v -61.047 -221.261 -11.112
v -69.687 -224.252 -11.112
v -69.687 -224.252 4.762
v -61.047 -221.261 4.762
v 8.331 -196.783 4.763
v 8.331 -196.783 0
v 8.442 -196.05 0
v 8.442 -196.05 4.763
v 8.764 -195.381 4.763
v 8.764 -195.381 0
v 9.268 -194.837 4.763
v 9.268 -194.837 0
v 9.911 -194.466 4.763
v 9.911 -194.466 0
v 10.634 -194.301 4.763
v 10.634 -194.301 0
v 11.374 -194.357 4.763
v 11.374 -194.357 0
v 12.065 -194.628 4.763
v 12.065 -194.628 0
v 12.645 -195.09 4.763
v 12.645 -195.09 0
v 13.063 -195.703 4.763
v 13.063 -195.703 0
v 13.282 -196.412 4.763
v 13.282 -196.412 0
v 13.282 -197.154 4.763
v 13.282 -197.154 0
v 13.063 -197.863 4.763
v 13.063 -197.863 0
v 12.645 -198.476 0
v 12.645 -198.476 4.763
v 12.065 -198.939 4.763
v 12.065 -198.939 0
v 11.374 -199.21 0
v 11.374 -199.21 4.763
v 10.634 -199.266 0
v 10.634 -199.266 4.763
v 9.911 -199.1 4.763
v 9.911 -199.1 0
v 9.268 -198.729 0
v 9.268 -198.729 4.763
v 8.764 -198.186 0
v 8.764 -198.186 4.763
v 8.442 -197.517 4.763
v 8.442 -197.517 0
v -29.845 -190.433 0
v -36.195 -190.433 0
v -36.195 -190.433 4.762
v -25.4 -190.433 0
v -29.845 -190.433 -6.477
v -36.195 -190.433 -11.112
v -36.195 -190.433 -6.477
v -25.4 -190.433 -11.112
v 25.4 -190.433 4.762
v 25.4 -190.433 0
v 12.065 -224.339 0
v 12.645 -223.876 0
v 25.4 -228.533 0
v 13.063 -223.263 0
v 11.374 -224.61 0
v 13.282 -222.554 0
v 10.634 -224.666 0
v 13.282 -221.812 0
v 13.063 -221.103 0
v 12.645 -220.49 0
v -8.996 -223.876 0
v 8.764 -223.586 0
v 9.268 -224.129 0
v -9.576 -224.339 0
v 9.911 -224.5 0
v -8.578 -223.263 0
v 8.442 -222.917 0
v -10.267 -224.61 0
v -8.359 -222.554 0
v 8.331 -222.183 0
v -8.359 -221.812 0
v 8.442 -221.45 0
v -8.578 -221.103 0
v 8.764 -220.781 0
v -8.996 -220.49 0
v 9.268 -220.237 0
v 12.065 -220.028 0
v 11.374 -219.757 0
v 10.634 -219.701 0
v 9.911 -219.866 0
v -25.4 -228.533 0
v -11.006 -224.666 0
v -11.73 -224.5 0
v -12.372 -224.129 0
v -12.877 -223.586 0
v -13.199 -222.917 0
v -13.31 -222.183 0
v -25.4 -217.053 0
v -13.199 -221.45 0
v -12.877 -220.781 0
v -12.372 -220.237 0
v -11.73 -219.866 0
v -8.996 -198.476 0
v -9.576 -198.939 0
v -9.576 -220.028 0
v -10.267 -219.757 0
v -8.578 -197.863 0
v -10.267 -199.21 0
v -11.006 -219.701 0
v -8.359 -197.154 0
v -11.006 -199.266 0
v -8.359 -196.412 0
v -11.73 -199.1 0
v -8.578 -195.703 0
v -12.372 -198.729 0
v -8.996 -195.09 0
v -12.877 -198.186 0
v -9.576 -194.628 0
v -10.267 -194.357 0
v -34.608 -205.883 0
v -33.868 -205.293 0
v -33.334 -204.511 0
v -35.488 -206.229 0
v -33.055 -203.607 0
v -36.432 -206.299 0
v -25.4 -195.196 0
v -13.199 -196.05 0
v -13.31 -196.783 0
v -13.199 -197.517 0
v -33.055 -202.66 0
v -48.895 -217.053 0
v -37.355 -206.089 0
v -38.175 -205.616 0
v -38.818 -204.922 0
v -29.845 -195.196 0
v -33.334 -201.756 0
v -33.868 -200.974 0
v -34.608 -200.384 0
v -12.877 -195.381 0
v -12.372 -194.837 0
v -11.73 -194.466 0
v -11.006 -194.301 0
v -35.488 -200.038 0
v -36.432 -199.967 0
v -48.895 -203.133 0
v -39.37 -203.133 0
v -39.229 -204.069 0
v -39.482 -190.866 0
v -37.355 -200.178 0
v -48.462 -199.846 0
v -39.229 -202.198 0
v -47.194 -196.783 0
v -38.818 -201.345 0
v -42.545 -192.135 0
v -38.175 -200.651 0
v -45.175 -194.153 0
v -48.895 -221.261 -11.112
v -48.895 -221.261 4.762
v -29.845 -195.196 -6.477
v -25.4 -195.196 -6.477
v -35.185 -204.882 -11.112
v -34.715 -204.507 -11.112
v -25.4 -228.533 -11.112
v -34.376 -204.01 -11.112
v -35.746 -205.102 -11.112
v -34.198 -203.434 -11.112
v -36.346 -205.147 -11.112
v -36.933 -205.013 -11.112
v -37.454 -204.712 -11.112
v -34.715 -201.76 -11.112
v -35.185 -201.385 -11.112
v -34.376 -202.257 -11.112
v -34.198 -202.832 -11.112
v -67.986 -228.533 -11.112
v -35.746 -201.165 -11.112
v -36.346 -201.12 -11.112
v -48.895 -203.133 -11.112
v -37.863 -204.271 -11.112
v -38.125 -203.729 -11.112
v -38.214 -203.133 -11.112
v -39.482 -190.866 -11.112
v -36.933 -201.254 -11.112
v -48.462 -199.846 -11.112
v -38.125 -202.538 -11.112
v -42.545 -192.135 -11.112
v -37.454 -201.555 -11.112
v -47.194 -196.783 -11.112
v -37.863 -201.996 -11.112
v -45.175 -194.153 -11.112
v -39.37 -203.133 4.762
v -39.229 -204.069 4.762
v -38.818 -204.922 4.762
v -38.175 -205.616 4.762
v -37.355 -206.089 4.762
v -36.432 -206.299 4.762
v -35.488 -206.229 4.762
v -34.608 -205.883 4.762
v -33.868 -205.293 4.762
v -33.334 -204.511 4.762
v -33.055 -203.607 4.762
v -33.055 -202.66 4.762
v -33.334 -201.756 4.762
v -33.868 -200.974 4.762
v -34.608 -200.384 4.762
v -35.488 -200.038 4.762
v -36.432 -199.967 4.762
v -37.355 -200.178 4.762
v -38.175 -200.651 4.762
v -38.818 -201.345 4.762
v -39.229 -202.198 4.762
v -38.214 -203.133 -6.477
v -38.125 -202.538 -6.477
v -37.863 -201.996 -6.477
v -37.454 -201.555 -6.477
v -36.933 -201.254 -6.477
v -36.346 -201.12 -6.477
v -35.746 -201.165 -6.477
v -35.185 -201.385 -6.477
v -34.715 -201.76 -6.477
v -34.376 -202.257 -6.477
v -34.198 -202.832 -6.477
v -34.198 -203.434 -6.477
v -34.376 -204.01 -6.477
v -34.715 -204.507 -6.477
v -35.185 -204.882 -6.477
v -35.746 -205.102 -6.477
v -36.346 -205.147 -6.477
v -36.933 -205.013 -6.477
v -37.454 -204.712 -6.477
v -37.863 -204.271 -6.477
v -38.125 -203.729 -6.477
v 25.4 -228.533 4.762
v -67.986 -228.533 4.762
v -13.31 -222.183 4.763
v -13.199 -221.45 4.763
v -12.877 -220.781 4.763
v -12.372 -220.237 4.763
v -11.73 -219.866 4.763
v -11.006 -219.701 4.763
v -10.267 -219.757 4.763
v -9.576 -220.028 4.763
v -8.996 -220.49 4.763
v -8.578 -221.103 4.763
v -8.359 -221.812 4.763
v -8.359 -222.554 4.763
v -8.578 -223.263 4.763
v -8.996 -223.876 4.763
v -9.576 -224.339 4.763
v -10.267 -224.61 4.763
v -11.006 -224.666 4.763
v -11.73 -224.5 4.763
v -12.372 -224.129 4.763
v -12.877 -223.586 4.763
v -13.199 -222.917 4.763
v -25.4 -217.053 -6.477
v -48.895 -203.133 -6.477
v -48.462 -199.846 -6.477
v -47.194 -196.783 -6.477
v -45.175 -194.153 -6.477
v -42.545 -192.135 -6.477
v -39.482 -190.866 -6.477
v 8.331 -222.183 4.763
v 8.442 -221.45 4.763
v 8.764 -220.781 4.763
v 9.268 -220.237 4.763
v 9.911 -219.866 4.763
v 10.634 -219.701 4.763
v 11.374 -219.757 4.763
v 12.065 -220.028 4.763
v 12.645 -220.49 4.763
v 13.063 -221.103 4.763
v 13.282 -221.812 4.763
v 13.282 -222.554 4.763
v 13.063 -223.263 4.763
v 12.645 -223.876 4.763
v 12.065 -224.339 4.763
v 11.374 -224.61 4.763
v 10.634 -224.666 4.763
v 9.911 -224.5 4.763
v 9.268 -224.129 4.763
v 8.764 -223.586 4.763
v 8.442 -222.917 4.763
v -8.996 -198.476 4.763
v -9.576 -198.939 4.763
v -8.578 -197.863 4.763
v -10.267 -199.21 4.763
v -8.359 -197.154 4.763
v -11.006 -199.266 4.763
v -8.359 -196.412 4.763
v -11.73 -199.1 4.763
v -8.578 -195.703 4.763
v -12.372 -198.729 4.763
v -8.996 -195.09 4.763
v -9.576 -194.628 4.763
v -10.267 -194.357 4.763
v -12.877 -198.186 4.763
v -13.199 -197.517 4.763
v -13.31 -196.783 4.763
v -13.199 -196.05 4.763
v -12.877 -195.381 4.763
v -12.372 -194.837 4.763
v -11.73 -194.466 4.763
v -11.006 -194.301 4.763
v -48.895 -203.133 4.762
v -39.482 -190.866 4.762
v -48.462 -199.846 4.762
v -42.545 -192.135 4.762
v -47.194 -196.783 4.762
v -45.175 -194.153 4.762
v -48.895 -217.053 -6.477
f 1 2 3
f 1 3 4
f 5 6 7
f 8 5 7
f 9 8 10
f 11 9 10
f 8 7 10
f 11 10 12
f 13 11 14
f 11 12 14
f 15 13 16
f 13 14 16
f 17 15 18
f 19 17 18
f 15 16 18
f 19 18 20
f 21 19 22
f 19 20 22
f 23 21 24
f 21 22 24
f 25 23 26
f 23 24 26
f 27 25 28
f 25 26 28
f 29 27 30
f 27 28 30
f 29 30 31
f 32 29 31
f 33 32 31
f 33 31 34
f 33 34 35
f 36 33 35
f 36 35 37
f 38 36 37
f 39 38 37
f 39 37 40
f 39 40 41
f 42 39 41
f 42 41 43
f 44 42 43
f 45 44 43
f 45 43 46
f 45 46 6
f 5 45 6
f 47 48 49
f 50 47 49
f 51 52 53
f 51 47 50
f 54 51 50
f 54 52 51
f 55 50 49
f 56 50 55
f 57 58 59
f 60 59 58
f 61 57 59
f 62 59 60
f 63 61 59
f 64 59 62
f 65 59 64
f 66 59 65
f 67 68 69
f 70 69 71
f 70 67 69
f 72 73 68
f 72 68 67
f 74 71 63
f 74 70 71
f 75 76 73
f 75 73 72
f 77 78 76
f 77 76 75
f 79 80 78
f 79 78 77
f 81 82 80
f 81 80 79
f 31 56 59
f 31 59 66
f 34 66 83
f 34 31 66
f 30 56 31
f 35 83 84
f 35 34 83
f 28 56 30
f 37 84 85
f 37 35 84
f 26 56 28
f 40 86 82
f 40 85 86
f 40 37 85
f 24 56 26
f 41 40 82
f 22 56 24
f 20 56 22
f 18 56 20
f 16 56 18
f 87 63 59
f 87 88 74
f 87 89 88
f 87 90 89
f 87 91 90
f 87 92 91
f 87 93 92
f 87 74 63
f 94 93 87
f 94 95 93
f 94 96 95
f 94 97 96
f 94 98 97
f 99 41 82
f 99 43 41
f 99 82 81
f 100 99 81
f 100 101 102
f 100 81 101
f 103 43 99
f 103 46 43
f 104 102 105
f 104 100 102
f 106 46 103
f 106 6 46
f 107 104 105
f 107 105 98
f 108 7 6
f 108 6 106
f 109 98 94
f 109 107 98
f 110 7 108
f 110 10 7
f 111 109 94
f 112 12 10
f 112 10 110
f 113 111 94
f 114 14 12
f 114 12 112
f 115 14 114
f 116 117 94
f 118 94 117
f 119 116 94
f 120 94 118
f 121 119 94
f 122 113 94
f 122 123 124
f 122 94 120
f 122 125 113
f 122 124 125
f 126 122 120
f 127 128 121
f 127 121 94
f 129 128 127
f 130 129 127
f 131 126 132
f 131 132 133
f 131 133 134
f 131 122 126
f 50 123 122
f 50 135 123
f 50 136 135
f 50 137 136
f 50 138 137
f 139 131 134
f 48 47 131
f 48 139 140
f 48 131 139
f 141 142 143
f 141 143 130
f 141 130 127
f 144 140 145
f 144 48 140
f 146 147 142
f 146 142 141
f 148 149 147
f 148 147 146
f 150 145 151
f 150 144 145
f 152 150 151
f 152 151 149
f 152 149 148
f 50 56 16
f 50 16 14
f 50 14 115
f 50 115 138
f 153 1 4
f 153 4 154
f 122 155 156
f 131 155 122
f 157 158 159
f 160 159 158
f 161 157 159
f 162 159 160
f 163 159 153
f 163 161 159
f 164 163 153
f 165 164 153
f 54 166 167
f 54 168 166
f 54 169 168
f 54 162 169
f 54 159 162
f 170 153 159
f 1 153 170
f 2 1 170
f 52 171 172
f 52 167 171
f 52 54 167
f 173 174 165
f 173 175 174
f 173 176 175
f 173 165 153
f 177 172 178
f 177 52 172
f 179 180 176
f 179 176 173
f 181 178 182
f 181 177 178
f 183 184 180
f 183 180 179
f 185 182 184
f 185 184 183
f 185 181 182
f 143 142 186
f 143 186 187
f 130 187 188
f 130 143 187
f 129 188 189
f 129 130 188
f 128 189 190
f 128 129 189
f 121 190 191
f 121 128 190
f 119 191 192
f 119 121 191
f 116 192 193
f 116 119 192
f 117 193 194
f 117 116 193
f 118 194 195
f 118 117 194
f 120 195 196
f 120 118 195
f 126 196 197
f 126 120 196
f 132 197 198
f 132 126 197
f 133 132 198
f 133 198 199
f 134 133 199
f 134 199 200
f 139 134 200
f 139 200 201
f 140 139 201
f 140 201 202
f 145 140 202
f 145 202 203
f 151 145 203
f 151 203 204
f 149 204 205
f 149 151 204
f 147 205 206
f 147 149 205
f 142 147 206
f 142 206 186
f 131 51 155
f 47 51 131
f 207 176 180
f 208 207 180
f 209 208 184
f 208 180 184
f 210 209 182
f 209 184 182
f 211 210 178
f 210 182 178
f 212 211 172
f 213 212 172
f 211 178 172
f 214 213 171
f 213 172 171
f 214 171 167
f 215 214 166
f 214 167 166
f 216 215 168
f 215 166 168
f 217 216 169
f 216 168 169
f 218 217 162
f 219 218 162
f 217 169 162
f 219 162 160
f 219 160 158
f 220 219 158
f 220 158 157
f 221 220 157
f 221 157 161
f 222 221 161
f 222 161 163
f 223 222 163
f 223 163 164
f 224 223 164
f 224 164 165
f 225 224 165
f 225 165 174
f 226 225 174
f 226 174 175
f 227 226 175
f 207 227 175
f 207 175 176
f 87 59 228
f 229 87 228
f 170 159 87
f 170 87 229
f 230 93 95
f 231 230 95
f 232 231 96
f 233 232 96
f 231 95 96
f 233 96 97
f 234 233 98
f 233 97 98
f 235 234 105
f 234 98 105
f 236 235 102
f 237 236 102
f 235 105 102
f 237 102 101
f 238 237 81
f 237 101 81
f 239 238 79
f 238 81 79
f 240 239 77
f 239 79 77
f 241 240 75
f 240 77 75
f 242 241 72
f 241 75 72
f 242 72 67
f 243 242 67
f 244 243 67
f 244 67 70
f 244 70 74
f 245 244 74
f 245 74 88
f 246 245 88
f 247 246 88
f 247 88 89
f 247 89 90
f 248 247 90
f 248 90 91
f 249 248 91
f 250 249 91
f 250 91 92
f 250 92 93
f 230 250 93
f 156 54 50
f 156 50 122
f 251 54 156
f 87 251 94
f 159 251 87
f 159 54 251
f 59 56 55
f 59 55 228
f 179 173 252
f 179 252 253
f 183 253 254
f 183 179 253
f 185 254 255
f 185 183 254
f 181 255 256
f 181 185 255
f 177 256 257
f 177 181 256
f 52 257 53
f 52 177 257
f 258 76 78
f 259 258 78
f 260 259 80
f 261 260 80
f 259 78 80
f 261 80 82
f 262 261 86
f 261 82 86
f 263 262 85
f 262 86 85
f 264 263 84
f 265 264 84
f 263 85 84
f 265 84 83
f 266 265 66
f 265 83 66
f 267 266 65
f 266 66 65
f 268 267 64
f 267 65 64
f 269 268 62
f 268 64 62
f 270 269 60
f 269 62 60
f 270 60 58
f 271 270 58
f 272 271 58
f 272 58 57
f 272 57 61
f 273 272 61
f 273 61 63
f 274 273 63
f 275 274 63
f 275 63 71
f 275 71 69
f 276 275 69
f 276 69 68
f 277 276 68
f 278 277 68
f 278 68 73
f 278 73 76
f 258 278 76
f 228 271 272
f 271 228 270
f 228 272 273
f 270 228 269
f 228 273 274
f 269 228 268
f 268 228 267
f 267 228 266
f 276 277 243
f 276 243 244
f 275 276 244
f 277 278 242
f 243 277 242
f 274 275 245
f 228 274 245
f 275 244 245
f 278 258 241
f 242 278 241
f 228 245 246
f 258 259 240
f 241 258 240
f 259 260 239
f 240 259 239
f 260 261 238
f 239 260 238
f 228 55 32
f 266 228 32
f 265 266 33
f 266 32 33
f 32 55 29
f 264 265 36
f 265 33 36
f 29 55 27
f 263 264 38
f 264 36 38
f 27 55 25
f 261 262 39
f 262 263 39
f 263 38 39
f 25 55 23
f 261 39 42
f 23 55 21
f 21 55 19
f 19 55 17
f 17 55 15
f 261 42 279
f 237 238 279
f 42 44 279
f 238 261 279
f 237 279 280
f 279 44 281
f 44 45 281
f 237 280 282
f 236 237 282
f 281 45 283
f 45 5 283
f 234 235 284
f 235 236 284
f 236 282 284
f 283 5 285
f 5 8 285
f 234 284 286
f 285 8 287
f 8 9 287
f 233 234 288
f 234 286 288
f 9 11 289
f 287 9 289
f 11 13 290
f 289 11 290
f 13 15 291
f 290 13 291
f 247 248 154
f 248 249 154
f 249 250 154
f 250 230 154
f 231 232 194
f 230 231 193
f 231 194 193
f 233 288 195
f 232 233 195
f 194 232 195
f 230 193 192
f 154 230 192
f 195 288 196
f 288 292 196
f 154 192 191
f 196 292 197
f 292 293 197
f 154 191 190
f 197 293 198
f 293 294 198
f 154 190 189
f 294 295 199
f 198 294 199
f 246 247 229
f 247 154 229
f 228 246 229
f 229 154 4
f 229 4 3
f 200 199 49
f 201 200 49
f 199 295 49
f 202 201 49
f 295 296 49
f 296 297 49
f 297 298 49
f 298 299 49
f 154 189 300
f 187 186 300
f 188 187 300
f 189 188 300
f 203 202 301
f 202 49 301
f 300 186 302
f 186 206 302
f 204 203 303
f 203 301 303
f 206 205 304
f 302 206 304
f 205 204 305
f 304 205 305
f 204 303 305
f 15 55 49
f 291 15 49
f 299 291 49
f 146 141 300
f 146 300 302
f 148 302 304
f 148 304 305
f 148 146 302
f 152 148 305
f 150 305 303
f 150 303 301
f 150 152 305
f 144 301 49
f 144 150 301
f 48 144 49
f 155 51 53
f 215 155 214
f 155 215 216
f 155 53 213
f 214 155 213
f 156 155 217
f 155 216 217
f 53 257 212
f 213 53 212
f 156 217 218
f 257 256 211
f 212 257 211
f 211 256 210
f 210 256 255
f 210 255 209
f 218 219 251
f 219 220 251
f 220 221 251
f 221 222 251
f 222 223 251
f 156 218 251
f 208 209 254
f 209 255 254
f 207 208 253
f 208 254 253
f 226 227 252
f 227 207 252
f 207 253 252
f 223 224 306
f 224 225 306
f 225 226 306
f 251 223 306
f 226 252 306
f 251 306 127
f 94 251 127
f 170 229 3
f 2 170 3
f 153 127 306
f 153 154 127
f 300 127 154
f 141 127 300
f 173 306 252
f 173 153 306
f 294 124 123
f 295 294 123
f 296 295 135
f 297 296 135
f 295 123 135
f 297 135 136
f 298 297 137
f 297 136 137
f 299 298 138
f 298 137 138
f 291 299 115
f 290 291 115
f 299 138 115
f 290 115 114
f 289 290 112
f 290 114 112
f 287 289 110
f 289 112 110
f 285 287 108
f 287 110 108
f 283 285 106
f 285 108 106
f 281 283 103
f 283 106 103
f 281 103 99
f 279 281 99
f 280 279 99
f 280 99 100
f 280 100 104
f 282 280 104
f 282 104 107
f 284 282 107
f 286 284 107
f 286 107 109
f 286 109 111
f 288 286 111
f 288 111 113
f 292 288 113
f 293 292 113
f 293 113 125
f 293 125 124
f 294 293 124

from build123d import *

# Parameters (mm, degrees)
SKETCH2_R                  = 3.175
BOSS_EXTRUDE1_DEPTH        = 4.7625
BOSS_EXTRUDE2_START        = 11.1125
BOSS_EXTRUDE2_DEPTH        = 11.1125
SKETCH12_W                 = 6.477
SKETCH12_H                 = 21.856650617
CUT_EXTRUDE1_DEPTH         = 24.13
SKETCH12_3_W               = 6.477
SKETCH12_3_H               = 4.7625
CUT_EXTRUDE2_DEPTH         = 19.05
TAP_DRILL_FOR_10_32_TAP1_D = 4.0386
F_10_CLEARANCE_HOLE2_D     = 4.9784


with BuildPart() as part:
    # Sketch2 → Boss-Extrude1 (new body)
    with BuildSketch(Plane.XY):
        with BuildLine():
            Line((-67.986186343, -228.533359856), (-69.686856366, -224.252380141))
            Line((-69.686856366, -224.252380141), (-61.0470258, -221.260552334))
            Line((-61.0470258, -221.260552334), (-48.895, -221.260552334))
            Line((-48.895, -221.260552334), (-48.895, -203.133359856))
            ThreePointArc((-48.895, -203.133359856), (-45.175256121, -194.153103735), (-36.195, -190.433359856))
            Line((-36.195, -190.433359856), (25.4, -190.433359856))
            Line((25.4, -190.433359856), (25.4, -228.533359856))
            Line((25.4, -228.533359856), (-67.986186343, -228.533359856))
        make_face()
        with Locations((-36.195, -203.133359856)):
            Circle(SKETCH2_R, mode=Mode.SUBTRACT)
    extrude(amount=BOSS_EXTRUDE1_DEPTH)

    # Sketch11 → Boss-Extrude2 (add)
    with BuildSketch(Plane(origin=(0, 0, 0), x_dir=(-1, 0, 0), z_dir=(0, 0, -1)).offset(BOSS_EXTRUDE2_START)):
        with BuildLine():
            Line((25.4, -190.433359856), (25.4, -228.533359856))
            Line((25.4, -228.533359856), (67.986186343, -228.533359856))
            Line((67.986186343, -228.533359856), (69.686856366, -224.252380141))
            Line((69.686856366, -224.252380141), (61.0470258, -221.260552334))
            Line((61.0470258, -221.260552334), (48.895, -221.260552334))
            Line((48.895, -221.260552334), (48.895, -203.133359856))
            ThreePointArc((48.895, -203.133359856), (45.175256121, -194.153103735), (36.195, -190.433359856))
            Line((36.195, -190.433359856), (25.4, -190.433359856))
        make_face()
    extrude(amount=-BOSS_EXTRUDE2_DEPTH)

    # Sketch12 → Cut-Extrude1 (cut)
    with BuildSketch(Plane.ZY.offset(48.895)):
        with Locations((-3.2385, -206.124185165)):
            Rectangle(SKETCH12_W, SKETCH12_H)
    extrude(amount=-CUT_EXTRUDE1_DEPTH, mode=Mode.SUBTRACT)

    # Sketch12<3> → Cut-Extrude2 (cut)
    with BuildSketch(Plane.ZY.offset(48.895)):
        with Locations((-3.2385, -192.814609856)):
            Rectangle(SKETCH12_3_W, SKETCH12_3_H)
    extrude(amount=-CUT_EXTRUDE2_DEPTH, mode=Mode.SUBTRACT)

    # Tap Drill for #10-32 Tap1 (through all)
    with Locations(Plane.XY.offset(-6.477)):
        with Locations((-36.195, -203.133359856)):
            Hole(TAP_DRILL_FOR_10_32_TAP1_D / 2)

    # #10 Clearance Hole2 (through all)
    with Locations(Plane.XY.offset(4.7625)):
        with Locations((-10.8204, -196.783359856), (-10.8204, -222.183359856), (10.8204, -222.183359856), (10.8204, -196.783359856)):
            Hole(F_10_CLEARANCE_HOLE2_D / 2)


solid = part.part
